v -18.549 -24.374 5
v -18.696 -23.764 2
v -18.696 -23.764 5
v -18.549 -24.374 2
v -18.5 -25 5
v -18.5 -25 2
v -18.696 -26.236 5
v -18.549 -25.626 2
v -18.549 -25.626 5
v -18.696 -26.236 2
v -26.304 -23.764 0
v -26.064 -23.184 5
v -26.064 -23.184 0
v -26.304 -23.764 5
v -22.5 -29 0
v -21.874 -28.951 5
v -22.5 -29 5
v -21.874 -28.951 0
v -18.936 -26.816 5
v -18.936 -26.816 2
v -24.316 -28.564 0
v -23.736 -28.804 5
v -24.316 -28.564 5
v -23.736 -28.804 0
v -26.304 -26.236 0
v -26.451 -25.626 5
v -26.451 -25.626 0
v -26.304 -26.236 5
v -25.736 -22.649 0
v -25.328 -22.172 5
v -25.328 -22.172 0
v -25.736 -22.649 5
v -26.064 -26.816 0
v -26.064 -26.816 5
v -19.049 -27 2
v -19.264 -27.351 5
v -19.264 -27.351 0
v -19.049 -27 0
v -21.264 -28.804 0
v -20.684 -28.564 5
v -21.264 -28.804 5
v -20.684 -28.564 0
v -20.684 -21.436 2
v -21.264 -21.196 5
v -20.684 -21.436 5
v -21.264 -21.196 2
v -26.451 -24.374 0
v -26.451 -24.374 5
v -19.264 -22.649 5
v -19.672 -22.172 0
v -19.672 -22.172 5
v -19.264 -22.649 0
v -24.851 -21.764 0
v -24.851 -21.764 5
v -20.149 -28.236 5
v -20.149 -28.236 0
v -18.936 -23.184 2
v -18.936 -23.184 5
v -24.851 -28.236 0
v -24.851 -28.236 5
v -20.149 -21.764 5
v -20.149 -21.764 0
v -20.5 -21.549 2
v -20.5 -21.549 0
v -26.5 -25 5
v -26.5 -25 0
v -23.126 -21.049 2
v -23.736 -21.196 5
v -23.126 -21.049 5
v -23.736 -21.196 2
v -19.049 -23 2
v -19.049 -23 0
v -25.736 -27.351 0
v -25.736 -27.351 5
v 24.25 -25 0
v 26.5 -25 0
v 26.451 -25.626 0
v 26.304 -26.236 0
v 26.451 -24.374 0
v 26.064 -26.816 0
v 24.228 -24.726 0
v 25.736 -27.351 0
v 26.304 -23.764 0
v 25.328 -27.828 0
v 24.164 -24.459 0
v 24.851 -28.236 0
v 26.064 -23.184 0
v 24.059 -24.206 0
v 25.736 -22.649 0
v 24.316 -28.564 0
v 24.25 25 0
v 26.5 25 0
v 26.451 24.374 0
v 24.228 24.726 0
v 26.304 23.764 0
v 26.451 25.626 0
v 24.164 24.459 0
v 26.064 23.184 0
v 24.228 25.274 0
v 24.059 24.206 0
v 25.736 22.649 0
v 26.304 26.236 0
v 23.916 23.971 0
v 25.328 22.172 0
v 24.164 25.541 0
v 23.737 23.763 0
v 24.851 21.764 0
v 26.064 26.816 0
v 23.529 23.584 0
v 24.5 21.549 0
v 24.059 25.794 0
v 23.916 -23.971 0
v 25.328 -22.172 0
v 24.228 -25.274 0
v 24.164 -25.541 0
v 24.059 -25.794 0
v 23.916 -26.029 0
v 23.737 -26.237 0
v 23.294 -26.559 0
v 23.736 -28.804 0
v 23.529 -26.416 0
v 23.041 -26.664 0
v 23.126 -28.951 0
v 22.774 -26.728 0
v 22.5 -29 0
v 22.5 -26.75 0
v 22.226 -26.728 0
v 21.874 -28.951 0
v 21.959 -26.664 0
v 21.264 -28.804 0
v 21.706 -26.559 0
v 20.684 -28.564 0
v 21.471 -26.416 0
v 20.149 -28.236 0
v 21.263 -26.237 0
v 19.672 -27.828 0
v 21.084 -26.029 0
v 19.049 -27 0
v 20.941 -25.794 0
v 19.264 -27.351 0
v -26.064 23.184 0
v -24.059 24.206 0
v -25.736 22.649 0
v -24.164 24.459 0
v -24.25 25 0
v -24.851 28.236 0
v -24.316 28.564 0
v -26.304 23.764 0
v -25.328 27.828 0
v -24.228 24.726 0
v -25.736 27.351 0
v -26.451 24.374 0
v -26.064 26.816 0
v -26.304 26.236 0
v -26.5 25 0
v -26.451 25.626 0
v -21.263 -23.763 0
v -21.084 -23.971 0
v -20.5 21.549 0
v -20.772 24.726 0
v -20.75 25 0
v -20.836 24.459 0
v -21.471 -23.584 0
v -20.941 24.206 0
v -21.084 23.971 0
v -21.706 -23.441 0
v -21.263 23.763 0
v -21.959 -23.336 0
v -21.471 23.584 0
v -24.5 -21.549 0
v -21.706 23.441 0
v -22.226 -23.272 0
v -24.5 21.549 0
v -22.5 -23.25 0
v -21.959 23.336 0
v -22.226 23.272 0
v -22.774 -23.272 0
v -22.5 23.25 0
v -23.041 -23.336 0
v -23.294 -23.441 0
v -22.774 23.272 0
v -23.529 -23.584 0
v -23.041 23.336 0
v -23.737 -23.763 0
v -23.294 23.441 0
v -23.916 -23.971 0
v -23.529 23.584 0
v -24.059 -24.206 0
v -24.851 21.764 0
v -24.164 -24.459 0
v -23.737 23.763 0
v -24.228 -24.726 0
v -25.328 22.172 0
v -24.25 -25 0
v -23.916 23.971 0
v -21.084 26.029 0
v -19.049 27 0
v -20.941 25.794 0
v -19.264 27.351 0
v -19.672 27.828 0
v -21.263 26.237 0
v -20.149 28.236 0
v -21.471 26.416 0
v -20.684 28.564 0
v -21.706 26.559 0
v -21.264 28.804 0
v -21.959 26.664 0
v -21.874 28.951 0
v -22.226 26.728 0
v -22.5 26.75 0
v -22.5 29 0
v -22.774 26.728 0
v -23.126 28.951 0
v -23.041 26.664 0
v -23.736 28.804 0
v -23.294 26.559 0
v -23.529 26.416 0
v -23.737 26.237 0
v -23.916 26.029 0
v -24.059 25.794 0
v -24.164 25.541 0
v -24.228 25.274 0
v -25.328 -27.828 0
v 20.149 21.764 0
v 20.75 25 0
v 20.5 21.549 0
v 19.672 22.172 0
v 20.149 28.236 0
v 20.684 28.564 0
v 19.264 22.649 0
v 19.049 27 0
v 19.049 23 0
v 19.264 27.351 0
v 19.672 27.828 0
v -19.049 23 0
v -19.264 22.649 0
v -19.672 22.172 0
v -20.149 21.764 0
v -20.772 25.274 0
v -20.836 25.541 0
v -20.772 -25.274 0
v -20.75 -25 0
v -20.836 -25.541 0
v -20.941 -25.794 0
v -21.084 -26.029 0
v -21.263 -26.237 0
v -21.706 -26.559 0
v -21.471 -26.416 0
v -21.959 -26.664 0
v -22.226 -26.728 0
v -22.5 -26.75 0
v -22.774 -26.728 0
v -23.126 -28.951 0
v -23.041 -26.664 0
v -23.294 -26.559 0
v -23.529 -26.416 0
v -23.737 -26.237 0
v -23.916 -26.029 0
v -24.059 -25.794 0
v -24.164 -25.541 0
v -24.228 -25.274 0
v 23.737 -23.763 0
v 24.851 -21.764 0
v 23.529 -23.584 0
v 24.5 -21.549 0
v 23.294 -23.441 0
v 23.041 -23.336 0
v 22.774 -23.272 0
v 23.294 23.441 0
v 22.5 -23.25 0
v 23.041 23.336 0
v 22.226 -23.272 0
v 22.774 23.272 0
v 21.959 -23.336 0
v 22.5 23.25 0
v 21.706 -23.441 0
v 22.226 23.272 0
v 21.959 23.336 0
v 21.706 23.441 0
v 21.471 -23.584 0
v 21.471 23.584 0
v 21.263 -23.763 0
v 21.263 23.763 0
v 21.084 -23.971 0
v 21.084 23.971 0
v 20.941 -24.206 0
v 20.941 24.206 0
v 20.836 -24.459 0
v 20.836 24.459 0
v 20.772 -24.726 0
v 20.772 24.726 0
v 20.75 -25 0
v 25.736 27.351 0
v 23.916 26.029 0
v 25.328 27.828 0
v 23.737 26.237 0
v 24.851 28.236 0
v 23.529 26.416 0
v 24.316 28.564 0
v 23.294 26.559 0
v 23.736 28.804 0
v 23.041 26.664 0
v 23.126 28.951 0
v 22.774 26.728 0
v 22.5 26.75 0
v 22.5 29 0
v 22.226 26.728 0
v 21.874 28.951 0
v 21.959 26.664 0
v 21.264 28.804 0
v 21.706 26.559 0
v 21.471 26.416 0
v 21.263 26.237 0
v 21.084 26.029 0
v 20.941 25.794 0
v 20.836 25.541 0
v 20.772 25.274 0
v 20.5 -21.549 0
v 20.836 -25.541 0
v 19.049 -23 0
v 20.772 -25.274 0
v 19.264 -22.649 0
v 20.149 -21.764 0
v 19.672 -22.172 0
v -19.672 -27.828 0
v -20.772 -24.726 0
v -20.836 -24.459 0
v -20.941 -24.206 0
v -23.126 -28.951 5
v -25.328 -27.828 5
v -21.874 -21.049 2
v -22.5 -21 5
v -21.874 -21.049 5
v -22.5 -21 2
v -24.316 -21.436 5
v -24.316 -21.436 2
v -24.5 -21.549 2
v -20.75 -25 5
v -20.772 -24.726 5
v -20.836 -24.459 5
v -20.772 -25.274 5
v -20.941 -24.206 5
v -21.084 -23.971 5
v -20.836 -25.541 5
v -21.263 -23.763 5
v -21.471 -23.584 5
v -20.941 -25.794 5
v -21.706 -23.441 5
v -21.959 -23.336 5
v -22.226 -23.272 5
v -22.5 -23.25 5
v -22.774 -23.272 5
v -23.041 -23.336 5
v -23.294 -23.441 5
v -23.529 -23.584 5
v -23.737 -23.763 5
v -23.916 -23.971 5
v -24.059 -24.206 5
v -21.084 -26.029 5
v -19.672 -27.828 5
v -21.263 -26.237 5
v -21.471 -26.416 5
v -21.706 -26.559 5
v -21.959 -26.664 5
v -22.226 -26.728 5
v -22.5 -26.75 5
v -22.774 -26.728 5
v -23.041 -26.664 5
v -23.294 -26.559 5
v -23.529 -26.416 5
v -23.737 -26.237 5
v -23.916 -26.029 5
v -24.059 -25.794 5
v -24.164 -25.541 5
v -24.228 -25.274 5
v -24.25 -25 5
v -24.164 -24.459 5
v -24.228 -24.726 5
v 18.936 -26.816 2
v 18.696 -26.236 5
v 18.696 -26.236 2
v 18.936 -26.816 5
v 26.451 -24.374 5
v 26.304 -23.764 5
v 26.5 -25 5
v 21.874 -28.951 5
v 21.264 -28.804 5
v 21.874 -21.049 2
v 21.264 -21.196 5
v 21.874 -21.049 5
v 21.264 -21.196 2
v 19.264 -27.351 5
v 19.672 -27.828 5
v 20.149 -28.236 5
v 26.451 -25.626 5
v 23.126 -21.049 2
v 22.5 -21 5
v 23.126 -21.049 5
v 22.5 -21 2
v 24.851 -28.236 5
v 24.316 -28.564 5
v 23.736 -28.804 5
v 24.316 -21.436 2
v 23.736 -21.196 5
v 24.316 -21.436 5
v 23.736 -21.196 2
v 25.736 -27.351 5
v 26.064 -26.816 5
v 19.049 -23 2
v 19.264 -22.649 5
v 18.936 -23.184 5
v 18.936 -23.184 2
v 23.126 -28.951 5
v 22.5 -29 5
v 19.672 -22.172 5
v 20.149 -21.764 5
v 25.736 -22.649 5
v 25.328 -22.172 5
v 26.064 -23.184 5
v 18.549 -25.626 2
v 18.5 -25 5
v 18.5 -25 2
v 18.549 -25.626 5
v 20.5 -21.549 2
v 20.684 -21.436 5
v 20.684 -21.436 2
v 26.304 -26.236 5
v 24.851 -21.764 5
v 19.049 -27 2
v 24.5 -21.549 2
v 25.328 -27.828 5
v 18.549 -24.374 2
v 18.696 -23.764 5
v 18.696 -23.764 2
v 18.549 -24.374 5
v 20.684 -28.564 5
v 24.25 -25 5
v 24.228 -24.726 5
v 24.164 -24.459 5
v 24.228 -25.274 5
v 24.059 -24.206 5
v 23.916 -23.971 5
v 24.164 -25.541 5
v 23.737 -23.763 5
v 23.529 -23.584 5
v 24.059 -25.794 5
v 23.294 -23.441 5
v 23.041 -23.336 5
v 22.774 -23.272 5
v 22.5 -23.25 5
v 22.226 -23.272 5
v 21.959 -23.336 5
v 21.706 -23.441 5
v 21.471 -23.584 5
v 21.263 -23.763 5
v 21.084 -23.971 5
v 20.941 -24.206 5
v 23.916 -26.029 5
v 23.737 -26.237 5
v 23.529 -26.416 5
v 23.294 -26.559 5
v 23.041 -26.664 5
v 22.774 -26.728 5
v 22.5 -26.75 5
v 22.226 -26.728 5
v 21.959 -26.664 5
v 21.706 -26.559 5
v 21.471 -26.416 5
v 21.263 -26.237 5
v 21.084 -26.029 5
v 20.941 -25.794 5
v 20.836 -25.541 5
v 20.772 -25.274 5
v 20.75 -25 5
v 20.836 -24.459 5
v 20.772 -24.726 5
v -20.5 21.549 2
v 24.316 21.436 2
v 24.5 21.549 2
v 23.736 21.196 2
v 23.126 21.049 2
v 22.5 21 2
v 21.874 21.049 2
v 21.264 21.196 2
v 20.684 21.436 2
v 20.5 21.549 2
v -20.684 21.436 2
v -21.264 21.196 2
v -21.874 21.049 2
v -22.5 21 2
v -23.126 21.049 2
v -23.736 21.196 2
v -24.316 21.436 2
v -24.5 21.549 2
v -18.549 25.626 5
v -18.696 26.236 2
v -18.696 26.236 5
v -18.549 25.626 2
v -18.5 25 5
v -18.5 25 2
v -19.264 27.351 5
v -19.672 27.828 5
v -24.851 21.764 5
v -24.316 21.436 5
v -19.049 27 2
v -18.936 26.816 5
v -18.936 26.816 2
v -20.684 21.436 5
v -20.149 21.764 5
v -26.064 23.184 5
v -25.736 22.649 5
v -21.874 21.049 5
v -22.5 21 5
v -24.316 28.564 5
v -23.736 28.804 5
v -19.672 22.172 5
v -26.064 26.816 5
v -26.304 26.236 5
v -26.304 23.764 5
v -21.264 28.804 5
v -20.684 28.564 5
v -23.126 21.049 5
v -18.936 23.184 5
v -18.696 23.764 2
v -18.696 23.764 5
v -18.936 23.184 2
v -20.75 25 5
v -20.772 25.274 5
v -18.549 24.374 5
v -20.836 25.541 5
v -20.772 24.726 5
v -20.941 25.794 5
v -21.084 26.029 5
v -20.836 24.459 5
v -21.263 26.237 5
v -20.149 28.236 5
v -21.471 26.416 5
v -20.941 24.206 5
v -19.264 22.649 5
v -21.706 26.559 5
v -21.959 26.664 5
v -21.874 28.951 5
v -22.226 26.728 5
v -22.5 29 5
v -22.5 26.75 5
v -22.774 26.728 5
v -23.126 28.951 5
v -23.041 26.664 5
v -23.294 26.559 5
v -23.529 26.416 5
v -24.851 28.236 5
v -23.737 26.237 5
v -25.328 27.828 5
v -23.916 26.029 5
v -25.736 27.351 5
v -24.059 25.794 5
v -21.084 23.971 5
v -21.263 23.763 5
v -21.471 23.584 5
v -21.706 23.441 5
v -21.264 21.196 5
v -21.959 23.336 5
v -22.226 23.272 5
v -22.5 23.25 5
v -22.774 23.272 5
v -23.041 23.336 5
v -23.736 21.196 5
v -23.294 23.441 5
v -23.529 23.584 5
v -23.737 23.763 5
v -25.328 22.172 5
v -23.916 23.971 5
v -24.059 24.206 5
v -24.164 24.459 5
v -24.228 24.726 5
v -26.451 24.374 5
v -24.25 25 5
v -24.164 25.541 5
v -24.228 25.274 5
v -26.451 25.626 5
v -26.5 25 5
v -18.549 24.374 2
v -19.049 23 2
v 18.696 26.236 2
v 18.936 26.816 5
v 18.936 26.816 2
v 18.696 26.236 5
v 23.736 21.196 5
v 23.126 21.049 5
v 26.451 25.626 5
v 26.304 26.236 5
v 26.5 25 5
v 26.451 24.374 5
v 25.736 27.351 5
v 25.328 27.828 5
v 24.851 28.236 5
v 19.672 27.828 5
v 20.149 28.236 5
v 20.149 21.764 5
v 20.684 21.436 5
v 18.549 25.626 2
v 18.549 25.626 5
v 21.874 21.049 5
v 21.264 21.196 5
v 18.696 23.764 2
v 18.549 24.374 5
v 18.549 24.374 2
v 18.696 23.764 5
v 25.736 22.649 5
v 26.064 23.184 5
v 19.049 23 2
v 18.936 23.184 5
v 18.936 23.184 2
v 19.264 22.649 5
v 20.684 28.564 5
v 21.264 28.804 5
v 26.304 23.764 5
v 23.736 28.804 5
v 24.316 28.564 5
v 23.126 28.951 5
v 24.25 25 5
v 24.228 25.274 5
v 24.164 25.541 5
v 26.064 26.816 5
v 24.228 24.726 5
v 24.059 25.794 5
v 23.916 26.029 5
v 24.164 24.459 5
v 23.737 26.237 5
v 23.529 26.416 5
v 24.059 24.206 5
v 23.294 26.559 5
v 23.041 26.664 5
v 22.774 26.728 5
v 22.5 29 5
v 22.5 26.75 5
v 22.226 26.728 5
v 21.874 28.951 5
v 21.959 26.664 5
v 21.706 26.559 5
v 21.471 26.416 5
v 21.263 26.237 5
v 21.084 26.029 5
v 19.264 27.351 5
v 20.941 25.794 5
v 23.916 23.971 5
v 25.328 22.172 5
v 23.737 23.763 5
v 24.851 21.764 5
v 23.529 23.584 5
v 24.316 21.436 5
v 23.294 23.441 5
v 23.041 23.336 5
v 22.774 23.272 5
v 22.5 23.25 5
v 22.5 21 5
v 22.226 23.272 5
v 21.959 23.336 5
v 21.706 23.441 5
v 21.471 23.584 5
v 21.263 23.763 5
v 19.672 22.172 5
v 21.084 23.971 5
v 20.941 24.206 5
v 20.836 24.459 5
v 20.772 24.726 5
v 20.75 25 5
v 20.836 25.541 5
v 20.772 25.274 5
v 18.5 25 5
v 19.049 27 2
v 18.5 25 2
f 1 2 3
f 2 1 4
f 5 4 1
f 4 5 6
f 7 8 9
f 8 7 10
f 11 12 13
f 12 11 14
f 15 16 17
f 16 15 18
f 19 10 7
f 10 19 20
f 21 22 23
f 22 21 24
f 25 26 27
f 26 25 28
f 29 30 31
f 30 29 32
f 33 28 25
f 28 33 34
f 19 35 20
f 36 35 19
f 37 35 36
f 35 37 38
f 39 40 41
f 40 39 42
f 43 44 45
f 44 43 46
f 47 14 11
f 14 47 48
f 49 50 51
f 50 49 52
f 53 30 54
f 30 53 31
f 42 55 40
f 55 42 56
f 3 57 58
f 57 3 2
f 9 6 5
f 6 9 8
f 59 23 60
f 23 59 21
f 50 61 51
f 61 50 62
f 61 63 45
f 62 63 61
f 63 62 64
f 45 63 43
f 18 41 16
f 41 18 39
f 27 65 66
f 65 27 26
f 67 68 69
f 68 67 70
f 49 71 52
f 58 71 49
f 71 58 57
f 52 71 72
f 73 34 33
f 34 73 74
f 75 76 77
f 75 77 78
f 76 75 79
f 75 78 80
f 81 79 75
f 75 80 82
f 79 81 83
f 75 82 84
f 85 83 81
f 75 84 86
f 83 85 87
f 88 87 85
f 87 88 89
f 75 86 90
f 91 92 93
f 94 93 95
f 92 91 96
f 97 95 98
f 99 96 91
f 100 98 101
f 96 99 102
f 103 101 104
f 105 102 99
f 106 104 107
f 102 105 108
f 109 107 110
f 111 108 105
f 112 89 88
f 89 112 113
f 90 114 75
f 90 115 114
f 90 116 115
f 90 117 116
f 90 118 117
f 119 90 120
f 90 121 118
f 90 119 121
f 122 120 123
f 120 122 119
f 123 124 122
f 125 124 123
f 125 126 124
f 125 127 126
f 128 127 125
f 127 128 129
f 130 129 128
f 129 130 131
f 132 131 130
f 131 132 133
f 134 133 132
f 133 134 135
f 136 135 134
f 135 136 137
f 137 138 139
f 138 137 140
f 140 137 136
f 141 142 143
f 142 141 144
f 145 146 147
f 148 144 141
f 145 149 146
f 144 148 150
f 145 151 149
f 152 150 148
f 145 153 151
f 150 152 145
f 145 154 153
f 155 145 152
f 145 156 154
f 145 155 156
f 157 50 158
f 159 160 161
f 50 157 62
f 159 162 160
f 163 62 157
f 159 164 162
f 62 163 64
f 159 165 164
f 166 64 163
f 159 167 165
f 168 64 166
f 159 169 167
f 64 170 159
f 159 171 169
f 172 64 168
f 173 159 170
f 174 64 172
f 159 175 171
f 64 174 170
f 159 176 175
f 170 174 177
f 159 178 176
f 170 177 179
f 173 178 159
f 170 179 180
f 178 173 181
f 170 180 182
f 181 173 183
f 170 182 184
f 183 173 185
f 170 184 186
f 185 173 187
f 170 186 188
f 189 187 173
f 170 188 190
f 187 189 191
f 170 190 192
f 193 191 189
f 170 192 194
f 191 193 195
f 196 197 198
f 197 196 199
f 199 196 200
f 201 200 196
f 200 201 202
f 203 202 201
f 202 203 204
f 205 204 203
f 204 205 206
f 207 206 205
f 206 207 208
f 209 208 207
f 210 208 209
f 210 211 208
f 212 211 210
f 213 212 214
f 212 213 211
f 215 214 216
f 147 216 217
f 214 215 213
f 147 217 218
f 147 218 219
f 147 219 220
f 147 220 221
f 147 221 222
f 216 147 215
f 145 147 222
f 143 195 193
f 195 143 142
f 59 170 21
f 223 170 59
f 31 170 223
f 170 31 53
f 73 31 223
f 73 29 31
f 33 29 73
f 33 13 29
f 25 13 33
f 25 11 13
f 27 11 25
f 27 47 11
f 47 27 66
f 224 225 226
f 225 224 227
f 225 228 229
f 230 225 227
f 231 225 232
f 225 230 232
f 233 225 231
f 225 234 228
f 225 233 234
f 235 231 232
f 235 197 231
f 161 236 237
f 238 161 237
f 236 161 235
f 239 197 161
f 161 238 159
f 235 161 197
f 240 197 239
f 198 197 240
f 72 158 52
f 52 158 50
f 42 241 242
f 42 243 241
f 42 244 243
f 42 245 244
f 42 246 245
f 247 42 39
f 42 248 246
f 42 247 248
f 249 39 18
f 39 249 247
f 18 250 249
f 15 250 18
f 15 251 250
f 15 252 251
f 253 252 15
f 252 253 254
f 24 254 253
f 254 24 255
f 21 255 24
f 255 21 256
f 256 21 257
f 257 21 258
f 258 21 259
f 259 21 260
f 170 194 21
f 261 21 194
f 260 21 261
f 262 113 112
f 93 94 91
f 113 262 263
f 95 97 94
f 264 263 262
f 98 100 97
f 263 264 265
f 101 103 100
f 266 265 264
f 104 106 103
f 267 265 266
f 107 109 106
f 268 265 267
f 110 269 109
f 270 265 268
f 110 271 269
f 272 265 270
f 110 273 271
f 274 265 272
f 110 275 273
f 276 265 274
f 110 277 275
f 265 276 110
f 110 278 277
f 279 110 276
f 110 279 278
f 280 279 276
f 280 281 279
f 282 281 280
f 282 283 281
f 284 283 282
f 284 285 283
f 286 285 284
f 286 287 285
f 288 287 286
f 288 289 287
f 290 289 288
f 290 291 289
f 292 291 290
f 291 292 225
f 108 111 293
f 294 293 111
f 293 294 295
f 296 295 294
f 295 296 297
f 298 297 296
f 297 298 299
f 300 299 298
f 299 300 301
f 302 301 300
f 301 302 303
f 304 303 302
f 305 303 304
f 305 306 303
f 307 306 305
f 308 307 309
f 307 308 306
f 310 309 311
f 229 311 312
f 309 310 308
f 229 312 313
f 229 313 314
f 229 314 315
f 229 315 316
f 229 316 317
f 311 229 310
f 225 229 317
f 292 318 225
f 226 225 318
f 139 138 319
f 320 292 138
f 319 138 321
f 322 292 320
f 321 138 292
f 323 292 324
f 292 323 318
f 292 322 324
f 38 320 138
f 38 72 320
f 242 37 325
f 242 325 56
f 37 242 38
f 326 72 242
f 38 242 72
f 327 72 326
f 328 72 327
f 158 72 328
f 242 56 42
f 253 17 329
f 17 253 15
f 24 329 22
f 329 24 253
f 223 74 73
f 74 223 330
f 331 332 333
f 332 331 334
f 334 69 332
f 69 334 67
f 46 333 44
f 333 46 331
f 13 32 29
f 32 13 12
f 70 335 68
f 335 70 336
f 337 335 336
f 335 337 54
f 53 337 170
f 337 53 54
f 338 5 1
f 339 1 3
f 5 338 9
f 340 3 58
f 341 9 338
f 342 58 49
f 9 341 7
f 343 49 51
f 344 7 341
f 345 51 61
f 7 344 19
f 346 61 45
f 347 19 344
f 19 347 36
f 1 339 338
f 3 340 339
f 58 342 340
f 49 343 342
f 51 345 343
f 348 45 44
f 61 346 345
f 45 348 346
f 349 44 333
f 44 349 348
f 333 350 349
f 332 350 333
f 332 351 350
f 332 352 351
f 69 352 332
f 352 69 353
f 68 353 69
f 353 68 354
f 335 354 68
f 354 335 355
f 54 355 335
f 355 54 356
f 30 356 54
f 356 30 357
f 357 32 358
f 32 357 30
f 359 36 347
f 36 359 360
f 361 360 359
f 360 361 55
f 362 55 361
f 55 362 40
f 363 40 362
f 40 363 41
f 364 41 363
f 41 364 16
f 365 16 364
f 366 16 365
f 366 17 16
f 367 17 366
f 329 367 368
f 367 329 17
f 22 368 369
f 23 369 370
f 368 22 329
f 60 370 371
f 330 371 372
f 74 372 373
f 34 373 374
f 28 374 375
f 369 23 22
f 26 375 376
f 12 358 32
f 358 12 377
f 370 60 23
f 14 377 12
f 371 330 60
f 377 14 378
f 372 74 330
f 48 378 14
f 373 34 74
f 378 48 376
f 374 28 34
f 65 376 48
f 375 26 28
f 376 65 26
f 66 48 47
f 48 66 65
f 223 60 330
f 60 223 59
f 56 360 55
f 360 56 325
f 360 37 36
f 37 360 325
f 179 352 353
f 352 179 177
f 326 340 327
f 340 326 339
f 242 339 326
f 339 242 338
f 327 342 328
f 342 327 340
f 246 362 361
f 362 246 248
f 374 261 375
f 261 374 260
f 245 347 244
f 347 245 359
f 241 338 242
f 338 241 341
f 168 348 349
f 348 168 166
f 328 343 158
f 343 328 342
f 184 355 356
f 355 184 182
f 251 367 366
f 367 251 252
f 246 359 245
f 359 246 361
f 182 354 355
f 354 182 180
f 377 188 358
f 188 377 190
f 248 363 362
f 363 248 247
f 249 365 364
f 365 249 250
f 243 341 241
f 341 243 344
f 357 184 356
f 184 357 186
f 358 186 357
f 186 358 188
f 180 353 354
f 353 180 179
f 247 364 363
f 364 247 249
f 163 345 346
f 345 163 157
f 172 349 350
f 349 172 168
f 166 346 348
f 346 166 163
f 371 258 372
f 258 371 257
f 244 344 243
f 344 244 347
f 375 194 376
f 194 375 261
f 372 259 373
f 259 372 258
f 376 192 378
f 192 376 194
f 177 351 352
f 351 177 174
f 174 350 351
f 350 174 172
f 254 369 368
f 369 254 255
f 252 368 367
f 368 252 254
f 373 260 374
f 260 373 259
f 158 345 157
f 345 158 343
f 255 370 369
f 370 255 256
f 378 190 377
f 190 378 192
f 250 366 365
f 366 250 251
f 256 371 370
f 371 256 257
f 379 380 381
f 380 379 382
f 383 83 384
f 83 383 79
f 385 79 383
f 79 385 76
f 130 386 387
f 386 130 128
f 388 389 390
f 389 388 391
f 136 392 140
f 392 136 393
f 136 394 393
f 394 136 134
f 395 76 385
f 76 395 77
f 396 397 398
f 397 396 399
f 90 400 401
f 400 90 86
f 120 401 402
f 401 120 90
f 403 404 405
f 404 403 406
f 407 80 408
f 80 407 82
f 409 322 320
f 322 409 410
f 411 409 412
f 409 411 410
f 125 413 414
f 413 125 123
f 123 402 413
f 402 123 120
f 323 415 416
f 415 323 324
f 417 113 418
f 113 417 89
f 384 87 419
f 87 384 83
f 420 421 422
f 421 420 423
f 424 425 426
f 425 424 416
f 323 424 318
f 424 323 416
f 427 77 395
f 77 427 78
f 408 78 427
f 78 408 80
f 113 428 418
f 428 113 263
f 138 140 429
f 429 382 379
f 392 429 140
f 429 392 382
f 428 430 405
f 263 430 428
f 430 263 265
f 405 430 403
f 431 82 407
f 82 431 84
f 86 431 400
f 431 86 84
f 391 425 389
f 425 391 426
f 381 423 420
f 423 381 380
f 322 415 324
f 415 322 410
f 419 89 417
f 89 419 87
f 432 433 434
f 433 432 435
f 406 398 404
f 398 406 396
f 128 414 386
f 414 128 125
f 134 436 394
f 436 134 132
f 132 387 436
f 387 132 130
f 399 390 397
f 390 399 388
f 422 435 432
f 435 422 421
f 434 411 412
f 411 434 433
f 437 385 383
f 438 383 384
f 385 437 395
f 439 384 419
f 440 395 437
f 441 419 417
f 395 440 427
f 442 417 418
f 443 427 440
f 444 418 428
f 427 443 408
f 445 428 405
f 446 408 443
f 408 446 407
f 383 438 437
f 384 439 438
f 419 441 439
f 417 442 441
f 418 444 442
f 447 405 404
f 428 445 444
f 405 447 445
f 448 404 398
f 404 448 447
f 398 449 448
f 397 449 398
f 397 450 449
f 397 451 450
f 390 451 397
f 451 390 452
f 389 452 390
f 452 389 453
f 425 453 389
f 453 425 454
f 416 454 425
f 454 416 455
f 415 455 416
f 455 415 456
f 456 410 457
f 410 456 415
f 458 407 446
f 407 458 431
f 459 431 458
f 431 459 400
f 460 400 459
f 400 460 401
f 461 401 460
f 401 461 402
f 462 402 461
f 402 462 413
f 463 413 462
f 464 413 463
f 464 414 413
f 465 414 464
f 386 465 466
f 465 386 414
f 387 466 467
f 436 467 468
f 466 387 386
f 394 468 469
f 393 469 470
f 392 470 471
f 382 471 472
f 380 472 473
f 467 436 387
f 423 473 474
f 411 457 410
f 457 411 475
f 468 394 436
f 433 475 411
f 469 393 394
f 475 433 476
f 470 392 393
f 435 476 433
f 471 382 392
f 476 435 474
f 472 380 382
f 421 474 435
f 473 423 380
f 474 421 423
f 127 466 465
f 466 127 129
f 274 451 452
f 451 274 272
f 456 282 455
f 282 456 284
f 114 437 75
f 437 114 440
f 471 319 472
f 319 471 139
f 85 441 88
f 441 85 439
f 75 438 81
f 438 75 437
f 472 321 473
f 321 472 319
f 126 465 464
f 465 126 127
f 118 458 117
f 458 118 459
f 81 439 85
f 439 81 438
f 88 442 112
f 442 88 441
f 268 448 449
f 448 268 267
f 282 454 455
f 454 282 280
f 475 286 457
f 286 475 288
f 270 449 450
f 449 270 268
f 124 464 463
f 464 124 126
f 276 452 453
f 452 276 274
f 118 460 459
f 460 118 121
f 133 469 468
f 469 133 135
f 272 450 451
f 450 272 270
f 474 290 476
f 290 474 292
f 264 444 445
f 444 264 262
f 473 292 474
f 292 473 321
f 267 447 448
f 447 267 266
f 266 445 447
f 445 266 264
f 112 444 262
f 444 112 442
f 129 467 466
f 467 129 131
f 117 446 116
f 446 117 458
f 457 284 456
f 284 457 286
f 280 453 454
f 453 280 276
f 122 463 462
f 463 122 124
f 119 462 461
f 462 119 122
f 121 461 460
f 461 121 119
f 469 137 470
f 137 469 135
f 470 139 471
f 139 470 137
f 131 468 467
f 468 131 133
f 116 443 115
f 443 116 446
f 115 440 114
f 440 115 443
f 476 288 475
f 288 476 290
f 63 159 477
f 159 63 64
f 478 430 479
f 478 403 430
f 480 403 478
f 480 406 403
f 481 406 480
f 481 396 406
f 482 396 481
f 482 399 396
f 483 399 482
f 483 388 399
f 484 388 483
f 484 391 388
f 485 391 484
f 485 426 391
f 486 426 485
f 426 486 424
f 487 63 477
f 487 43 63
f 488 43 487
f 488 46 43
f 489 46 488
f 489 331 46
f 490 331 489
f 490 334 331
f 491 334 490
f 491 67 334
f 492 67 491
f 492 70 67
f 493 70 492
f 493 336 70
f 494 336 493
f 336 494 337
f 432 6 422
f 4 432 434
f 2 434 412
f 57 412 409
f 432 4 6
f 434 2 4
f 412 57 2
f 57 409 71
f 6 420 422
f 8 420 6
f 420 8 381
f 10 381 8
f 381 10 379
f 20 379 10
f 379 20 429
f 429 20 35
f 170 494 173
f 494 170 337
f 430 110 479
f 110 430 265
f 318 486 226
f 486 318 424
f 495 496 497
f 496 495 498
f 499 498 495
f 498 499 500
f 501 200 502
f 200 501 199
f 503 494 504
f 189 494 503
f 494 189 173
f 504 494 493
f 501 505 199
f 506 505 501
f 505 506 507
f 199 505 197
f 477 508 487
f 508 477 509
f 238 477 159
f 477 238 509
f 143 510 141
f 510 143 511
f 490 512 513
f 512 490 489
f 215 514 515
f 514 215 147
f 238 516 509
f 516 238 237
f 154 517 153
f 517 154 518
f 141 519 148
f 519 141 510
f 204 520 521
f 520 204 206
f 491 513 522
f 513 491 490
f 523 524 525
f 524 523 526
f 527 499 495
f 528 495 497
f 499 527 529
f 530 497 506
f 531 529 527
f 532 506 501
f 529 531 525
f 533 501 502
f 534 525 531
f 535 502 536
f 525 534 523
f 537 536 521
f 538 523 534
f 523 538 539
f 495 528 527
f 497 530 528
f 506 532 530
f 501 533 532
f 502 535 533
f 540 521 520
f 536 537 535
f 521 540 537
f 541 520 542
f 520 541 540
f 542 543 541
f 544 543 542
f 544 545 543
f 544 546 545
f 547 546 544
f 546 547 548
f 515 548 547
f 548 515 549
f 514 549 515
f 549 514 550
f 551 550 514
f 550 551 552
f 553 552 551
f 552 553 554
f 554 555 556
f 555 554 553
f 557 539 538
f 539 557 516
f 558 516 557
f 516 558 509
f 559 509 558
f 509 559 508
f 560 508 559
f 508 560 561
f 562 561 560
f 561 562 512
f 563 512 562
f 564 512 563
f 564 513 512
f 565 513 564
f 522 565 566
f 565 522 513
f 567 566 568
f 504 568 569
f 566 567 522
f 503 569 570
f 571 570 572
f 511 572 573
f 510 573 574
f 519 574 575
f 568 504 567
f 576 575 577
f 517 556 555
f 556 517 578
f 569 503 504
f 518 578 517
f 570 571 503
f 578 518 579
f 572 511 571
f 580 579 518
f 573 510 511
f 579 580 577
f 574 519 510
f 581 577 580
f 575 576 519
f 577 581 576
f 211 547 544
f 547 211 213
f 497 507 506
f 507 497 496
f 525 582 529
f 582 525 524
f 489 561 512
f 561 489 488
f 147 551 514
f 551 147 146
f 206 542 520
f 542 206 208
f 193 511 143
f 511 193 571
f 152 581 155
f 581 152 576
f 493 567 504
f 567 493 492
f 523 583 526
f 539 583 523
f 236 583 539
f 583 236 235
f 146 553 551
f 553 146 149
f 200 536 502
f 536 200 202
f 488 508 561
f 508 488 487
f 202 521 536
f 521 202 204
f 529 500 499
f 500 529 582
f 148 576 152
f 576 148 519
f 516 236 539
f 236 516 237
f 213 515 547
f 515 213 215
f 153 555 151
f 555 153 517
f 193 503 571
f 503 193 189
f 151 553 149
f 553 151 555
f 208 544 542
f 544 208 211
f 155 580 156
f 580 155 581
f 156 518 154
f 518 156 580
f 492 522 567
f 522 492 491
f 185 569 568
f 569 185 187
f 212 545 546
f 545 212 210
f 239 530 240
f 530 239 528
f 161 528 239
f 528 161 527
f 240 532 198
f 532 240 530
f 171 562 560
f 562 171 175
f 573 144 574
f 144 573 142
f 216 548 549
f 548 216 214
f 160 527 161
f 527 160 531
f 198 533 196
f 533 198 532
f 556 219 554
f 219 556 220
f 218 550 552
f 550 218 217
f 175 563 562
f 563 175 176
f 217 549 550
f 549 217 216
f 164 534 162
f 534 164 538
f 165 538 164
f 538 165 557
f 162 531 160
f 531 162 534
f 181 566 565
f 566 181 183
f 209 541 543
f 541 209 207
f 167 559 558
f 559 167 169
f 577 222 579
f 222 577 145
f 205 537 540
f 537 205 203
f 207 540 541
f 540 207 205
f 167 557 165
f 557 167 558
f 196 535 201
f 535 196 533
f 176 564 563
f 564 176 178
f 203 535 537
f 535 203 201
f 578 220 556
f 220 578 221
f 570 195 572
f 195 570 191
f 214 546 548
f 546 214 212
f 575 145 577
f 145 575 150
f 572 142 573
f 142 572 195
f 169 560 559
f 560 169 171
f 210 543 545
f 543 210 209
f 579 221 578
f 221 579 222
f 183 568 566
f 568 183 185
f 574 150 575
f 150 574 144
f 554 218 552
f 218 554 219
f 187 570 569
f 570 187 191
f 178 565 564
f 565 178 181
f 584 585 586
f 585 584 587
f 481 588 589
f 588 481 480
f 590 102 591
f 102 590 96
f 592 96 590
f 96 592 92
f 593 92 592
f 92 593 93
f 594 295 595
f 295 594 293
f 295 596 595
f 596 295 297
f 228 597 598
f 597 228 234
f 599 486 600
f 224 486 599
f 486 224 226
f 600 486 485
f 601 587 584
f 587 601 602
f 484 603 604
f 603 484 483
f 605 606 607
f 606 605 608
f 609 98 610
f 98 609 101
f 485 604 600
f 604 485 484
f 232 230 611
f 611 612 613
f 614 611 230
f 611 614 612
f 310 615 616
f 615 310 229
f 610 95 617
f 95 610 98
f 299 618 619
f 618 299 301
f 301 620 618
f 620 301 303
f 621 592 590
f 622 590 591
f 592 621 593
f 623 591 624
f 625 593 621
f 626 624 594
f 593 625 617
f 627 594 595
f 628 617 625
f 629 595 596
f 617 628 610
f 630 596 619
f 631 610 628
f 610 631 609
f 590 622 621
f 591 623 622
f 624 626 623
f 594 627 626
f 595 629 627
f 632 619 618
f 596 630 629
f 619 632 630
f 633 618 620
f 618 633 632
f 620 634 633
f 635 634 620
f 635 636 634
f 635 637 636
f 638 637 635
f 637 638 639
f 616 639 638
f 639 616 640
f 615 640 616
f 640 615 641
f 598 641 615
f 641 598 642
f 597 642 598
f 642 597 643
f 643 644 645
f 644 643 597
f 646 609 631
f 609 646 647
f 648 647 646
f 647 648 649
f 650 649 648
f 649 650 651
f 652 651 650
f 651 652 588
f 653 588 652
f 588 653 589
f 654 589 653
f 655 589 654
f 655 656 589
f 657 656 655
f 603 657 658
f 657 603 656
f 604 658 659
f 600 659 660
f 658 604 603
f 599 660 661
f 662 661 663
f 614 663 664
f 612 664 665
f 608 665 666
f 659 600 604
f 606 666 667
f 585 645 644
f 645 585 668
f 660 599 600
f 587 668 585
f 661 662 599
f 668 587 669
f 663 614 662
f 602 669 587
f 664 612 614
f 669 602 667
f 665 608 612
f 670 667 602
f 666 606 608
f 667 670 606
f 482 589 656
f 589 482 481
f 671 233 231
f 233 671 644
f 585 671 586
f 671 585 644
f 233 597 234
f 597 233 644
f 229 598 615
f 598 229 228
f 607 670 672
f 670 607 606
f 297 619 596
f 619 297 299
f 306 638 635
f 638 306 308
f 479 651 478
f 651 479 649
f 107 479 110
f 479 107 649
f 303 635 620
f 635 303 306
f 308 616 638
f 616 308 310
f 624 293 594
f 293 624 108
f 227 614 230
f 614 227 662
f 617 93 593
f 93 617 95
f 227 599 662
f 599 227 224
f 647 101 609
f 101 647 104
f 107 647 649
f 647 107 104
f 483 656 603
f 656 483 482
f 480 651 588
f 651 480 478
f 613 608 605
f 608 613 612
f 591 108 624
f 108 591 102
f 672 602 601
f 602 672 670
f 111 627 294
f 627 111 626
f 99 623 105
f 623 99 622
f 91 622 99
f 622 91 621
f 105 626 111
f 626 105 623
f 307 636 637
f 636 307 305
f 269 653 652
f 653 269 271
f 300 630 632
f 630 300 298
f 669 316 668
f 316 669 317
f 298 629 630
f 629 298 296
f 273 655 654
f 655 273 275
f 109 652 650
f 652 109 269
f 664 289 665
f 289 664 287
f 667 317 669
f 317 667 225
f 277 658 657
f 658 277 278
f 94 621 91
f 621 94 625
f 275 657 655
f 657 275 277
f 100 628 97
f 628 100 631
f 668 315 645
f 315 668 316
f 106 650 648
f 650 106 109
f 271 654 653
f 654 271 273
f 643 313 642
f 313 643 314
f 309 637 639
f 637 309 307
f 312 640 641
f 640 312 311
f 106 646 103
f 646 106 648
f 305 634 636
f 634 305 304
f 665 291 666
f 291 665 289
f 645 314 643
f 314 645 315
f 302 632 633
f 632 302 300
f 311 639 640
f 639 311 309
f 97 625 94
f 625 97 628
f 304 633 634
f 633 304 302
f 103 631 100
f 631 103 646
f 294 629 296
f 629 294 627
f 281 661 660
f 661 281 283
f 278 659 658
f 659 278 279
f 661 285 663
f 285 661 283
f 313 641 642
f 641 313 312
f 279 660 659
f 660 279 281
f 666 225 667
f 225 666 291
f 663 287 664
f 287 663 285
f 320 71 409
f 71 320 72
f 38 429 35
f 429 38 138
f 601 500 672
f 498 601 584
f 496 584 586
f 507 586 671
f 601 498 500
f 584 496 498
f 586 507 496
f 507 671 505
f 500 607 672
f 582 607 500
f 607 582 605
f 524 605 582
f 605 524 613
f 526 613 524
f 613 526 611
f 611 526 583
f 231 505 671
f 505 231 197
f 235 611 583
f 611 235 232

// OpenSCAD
// Internal diameter of holes
internal_diameter = 3.5;

// External diameter of pillar
external_diameter = 8;

// Minimum wall thickness of pillars
minimum_wall_thickness = 1;

// Distance between holes on X axis
width = 45;

// Distance between holes on Y axis
length = 50;

// Height of pillars
height = 5;

// Number of cylinder segments
hole_segments = 40;

// Height of connecting strips
strip_height = 2;

// Internal radius of holes
internal_radius = internal_diameter / 2;

// External radius of pillars is limited by the minimum wall thickness
external_radius = max(external_diameter / 2, internal_radius + minimum_wall_thickness);

// Width of the connecting strips
strip_width = external_radius;

// prevents the connecting strips from encroaching on the holes
clearance = internal_diameter + 0.05;

module hide_parameters_below_this_point() {}

// prevents coplanar polygons on cylinder subtraction
fudge = 0.05;

union() {
    for (y=[-1:2:1]) {
        for (x=[-1:2:1]) {
            // subtract two cylinders to make a pillar
            difference() {
                // outside of cylinder
                translate([x*width/2,y*length/2,0]) {
                    cylinder(r=external_radius, height, $fn=hole_segments); 
                }
                // inside of cylinder
                translate([x*width/2,y*length/2,-fudge/2]) {
                    cylinder(r=internal_radius, height+fudge, $fn=hole_segments); 
                }
            }
            // connect along Y axis
            translate([x*width/2,0,strip_height/2]) {
                cube([strip_width,length-clearance,strip_height],center=true);
            }
        }
        // connect along X axis
        translate([0,y*length/2,strip_height/2]) {
             cube([width-clearance,strip_width,strip_height],center=true);
        }
    }
}
